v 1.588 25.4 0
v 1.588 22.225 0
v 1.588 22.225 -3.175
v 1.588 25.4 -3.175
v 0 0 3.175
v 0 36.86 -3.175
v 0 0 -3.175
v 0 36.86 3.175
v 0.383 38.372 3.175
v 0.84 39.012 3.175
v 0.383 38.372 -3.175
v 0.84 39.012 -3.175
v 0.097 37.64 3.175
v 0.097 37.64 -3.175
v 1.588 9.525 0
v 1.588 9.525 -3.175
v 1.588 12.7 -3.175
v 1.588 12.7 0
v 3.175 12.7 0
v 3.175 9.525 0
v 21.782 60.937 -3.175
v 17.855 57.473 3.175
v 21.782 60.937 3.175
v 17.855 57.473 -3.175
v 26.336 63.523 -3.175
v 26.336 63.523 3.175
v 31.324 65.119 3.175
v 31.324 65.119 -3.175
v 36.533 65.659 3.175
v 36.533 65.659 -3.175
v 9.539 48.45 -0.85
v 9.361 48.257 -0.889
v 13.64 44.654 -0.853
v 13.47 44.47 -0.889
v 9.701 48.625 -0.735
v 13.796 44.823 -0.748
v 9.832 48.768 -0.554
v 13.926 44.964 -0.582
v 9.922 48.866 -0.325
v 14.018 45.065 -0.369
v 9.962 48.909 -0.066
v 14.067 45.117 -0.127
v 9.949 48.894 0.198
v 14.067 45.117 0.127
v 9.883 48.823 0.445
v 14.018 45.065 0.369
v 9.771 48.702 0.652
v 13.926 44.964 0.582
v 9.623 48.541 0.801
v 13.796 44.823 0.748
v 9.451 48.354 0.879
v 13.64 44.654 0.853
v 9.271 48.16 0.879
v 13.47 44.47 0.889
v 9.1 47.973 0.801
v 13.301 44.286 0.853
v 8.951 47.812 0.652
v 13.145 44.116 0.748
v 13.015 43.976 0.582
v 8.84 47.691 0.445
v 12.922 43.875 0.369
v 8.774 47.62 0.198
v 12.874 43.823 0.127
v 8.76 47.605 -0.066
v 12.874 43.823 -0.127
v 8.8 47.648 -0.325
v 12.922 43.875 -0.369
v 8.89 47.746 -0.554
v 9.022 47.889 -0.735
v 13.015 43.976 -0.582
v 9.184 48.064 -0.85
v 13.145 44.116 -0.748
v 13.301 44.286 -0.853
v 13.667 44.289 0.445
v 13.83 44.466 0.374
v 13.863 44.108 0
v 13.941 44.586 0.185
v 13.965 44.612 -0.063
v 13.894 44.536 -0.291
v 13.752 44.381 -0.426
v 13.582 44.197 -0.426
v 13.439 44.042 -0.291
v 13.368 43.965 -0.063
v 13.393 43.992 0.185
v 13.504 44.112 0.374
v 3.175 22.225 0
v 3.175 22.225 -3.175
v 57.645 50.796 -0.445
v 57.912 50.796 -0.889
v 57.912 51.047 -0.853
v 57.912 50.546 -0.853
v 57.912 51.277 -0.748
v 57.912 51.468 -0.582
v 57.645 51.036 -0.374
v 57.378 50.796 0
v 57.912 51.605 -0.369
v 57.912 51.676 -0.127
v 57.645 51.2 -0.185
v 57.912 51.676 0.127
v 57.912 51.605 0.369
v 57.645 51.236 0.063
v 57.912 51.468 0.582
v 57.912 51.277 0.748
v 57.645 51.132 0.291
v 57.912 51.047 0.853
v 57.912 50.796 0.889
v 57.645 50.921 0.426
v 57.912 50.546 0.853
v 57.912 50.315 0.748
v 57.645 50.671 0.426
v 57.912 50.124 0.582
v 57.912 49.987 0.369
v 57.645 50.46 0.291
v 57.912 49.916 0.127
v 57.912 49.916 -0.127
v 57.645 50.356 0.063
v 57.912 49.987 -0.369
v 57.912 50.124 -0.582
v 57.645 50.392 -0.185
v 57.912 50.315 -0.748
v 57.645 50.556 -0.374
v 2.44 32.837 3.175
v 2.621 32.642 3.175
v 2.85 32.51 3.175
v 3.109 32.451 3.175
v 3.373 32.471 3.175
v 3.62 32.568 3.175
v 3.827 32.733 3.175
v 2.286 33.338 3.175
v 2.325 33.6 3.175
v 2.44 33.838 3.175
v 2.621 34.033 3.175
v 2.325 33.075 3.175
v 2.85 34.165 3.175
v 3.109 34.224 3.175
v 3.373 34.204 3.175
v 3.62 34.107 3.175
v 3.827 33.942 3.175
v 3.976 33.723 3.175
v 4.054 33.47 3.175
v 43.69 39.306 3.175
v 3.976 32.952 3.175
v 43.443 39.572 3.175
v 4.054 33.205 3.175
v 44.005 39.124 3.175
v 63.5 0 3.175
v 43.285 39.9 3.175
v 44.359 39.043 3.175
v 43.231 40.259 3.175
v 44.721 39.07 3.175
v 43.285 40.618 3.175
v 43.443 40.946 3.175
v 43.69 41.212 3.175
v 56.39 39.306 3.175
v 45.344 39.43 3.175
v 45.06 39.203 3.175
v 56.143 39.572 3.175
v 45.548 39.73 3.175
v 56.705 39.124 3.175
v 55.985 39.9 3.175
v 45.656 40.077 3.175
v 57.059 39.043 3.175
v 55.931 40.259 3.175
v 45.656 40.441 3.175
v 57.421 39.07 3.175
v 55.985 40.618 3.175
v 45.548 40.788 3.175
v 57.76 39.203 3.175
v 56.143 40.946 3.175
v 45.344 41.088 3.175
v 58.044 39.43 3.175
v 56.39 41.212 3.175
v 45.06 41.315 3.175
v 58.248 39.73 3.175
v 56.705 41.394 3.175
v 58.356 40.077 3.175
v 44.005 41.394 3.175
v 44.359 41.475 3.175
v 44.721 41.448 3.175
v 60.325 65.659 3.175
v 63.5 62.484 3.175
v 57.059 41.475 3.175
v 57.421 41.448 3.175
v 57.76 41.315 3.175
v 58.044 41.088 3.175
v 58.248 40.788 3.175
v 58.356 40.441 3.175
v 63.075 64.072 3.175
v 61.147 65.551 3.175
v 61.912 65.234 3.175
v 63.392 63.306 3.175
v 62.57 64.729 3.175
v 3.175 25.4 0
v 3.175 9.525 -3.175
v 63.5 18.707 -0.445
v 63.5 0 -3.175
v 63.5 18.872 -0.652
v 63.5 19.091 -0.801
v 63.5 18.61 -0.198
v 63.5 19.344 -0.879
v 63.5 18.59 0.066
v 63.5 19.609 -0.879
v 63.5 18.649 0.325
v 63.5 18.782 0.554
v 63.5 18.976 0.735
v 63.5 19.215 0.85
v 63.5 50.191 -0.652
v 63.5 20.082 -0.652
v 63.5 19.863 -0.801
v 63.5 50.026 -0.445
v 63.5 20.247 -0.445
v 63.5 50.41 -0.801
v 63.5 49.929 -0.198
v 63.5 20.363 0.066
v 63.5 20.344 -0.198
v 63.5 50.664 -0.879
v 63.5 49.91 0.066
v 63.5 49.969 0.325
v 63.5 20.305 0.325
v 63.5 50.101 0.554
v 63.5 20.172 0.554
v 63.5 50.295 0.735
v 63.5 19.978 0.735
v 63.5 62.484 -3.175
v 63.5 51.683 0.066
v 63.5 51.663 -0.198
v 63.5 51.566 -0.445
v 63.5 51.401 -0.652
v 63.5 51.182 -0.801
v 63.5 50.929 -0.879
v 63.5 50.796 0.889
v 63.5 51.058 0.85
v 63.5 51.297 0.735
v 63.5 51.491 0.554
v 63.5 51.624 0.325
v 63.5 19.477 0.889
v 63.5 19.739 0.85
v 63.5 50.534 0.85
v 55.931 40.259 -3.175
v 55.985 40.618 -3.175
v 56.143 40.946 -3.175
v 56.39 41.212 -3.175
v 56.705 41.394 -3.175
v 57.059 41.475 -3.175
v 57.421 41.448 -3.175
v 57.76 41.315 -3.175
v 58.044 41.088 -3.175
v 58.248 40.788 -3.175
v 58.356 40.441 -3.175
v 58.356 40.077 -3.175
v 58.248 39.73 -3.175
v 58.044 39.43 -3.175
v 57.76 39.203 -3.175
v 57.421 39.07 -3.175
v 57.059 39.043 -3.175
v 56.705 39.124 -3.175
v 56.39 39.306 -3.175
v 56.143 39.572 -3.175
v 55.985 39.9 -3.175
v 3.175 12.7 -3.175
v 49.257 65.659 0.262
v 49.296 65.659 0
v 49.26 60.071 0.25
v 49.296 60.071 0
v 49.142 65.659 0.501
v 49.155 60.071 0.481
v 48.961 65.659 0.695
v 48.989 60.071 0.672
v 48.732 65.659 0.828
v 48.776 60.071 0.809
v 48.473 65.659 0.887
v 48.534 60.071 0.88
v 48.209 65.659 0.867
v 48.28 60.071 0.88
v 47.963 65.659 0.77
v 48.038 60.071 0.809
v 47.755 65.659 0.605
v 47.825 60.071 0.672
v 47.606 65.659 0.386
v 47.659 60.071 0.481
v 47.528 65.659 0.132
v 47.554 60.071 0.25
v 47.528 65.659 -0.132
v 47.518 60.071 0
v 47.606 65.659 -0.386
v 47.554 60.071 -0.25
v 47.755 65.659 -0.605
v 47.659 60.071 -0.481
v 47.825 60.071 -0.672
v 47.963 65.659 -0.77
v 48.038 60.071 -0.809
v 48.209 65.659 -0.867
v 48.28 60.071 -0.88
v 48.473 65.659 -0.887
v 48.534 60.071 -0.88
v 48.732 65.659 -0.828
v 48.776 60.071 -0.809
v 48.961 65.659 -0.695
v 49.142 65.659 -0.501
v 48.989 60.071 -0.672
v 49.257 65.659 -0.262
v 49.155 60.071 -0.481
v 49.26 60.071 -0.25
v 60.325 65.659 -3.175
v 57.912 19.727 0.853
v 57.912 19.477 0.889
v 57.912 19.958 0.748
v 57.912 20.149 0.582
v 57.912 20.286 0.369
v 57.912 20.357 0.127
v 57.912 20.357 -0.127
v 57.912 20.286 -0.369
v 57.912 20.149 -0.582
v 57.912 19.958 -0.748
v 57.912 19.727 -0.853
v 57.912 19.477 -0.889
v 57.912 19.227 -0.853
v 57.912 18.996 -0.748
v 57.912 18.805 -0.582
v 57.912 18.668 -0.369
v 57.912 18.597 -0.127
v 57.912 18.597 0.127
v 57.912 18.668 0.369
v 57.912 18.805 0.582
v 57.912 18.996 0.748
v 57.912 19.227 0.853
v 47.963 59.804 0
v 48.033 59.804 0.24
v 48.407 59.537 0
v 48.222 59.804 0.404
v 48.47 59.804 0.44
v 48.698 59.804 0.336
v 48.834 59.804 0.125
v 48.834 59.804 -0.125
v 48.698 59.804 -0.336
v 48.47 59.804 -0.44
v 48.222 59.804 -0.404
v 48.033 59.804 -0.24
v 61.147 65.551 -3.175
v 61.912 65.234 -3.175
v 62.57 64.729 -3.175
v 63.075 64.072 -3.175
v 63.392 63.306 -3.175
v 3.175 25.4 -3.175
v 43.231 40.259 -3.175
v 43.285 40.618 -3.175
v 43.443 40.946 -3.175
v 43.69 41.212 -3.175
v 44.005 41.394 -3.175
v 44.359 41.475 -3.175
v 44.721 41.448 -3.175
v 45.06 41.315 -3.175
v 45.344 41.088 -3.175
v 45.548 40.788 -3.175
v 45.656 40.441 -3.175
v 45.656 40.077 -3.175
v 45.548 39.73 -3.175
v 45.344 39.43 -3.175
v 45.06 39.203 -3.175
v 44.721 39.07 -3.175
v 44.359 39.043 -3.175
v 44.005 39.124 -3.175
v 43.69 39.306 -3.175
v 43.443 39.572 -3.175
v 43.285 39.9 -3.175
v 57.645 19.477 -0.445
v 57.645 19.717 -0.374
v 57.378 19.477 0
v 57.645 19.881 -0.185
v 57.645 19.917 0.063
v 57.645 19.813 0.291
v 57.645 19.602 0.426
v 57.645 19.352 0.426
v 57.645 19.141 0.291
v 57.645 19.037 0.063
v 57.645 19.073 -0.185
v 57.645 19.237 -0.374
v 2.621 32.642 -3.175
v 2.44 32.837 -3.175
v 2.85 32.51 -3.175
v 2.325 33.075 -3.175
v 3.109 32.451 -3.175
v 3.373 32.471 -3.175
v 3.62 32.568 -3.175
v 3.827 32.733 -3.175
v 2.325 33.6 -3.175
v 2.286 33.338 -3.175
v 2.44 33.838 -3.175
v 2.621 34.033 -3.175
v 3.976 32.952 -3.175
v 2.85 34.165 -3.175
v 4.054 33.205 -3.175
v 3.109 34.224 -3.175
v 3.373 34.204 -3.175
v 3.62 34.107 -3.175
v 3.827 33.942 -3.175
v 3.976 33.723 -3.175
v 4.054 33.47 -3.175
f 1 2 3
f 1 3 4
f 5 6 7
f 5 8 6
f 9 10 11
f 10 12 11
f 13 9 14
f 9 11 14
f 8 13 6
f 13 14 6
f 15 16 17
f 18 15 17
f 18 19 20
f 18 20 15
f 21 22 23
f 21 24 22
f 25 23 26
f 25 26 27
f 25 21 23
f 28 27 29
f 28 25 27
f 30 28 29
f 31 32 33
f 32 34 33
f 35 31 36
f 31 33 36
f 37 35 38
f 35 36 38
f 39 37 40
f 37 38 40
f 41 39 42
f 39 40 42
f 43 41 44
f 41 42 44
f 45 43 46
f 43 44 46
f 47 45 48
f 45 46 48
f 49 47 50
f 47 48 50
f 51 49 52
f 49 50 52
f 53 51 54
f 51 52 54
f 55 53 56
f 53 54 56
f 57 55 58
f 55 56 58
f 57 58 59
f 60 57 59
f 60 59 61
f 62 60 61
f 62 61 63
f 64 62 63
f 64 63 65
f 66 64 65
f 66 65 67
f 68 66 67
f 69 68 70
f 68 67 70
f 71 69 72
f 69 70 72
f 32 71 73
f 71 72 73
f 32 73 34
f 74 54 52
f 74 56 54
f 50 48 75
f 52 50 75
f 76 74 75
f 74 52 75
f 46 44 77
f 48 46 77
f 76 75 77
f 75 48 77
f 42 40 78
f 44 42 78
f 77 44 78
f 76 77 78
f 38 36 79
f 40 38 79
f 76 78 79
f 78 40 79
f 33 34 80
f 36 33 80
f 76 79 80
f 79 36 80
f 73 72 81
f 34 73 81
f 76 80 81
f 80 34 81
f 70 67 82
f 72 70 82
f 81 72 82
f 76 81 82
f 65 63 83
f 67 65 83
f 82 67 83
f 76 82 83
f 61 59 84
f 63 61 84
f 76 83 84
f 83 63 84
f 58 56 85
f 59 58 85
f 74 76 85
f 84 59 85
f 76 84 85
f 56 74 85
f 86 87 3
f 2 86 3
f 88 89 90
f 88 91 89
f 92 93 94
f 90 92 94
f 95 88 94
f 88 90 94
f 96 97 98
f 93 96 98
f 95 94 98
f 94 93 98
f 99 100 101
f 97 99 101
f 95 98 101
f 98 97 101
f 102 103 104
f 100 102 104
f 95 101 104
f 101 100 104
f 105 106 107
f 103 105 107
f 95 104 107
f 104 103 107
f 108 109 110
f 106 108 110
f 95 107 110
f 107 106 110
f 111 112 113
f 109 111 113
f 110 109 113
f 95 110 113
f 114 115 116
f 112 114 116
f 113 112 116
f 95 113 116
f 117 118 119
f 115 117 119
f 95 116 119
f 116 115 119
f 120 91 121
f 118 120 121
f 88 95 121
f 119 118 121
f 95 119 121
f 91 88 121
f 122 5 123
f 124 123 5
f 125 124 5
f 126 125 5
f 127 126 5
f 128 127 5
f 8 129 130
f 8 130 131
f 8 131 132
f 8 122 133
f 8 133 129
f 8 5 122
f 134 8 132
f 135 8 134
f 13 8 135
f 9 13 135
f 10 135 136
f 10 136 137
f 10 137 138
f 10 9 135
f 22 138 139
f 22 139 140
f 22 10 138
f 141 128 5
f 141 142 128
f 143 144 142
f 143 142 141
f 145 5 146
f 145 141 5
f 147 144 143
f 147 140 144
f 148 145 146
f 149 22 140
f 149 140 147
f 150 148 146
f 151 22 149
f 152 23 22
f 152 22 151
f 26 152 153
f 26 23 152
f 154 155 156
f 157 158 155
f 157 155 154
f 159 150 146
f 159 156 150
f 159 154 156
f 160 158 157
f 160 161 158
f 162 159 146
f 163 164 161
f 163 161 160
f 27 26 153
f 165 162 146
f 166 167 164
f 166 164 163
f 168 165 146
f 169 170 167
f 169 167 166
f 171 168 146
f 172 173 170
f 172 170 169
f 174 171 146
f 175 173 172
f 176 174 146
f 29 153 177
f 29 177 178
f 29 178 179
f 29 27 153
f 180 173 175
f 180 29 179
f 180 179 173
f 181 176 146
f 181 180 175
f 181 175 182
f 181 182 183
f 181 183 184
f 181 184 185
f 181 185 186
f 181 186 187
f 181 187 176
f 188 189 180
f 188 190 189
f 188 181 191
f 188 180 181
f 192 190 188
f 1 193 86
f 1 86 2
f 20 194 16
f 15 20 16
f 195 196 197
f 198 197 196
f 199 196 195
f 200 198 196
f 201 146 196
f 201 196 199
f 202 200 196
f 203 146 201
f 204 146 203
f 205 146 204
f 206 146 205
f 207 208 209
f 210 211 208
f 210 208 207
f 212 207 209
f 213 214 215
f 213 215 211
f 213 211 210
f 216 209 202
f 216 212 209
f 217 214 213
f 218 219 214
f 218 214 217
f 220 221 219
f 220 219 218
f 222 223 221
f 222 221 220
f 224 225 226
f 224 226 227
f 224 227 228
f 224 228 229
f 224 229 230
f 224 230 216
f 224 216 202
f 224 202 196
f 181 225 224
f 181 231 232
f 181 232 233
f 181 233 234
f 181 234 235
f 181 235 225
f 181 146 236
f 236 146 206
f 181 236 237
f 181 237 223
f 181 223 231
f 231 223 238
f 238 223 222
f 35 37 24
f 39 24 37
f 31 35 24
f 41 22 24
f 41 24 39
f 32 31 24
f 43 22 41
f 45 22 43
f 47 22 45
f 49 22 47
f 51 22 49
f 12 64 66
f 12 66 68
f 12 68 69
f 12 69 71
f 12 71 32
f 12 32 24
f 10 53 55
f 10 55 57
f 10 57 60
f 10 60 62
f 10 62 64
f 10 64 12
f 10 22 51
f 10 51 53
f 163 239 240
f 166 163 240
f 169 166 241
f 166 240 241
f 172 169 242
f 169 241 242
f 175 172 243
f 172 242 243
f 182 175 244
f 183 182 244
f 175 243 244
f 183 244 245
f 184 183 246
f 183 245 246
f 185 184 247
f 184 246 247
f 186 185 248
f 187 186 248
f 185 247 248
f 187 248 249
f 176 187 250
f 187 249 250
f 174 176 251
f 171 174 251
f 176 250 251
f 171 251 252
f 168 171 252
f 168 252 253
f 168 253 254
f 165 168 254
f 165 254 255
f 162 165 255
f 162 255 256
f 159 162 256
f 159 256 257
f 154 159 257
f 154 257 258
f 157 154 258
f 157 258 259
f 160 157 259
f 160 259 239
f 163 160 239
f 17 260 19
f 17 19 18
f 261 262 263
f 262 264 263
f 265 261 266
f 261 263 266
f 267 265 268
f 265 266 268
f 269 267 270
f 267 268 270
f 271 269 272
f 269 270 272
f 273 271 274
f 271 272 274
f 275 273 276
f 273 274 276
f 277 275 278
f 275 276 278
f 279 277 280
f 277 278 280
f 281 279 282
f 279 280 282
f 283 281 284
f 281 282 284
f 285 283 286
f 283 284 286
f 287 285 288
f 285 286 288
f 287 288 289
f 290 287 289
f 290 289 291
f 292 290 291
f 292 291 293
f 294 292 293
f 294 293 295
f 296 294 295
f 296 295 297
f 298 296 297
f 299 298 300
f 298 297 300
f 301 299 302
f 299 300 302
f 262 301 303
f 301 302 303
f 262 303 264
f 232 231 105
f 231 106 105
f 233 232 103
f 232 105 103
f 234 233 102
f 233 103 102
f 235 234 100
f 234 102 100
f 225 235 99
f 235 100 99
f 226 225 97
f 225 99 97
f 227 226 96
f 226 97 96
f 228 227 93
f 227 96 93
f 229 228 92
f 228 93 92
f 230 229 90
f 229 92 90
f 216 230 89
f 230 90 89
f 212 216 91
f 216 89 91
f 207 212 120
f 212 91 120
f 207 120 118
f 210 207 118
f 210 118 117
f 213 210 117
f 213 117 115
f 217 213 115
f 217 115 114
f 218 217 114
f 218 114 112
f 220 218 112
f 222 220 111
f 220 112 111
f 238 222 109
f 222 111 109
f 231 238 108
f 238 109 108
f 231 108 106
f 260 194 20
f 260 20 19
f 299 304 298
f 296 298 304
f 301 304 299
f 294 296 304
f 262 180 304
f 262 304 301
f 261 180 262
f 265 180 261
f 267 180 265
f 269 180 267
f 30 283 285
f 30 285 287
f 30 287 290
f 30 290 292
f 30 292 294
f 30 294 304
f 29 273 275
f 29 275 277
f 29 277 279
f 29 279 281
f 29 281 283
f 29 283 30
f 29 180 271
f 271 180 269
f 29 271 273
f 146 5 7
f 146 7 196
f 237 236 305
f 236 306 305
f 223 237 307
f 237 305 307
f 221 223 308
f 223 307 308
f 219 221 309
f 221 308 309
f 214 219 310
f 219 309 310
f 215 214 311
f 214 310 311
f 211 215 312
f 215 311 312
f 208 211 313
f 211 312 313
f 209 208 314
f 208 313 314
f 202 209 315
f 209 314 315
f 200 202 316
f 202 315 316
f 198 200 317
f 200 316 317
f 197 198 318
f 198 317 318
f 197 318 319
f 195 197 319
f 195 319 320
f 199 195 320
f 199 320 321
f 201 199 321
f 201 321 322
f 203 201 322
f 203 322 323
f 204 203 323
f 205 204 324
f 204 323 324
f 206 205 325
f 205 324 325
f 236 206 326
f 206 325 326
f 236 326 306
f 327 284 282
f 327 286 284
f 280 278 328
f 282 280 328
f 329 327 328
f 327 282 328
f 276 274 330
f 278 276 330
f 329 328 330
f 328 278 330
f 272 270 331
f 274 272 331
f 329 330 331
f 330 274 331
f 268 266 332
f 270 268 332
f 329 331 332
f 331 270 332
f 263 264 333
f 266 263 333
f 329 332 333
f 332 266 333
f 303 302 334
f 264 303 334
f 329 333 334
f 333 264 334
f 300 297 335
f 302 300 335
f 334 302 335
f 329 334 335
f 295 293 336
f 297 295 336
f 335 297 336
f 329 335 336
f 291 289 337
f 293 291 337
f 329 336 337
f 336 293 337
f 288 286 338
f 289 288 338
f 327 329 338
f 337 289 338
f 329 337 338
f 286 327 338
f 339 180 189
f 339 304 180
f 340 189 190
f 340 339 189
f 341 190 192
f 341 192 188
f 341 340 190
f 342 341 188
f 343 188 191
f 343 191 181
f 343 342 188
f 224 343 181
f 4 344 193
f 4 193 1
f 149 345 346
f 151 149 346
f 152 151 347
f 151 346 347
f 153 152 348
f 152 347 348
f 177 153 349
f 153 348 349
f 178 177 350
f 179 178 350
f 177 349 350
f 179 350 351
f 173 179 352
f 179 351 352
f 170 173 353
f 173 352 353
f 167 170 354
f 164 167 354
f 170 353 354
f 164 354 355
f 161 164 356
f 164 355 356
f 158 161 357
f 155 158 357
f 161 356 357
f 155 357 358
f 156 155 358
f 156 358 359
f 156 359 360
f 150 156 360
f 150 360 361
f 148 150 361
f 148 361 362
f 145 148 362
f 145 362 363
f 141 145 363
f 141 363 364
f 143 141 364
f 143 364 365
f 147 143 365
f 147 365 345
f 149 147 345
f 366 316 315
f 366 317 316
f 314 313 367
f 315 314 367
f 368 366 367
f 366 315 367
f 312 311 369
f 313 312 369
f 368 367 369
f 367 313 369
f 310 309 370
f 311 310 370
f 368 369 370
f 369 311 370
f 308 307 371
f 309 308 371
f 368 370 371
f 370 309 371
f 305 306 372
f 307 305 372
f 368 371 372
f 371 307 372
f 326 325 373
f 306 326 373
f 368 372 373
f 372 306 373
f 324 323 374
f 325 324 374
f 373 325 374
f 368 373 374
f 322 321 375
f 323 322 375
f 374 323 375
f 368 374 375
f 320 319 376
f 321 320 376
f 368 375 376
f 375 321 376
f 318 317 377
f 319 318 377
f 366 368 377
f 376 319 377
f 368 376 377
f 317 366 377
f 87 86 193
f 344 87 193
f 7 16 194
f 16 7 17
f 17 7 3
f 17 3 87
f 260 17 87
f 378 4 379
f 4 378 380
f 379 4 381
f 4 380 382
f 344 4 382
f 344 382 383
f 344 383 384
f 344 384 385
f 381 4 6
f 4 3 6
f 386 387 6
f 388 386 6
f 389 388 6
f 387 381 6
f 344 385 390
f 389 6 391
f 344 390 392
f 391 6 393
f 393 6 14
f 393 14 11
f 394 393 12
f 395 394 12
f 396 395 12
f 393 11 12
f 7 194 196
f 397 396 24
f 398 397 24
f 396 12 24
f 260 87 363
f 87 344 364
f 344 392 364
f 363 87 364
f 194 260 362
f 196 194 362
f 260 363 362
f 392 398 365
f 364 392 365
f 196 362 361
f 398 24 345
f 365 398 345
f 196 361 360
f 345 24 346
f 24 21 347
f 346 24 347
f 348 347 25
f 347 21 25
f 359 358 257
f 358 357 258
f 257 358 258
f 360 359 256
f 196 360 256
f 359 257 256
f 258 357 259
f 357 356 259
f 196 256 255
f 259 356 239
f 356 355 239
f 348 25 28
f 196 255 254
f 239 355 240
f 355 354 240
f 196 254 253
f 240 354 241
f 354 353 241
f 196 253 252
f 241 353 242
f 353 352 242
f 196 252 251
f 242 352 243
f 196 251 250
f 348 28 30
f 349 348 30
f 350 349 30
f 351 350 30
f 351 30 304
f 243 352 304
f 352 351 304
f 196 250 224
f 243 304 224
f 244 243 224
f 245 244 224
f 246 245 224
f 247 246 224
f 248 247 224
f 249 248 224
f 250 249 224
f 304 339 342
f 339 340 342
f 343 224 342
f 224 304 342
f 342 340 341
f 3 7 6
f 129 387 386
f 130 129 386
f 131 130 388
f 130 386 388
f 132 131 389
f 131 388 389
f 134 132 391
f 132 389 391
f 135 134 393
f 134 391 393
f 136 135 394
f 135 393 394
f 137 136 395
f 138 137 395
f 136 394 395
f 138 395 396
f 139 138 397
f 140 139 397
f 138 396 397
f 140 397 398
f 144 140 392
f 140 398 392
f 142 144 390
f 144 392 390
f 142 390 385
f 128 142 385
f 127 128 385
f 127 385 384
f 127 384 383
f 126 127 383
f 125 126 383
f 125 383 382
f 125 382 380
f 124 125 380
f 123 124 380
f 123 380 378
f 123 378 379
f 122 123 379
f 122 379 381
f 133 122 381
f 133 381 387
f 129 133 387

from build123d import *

# Parameters (mm, degrees)
BOSS_EXTRUDE1_DEPTH       = 3.175
FILLET1_R                 = 25.4
FILLET2_R                 = 3.175
FILLET3_R                 = 3.175
F_2_56_TAPPED_HOLE1_D     = 1.778
F_2_56_TAPPED_HOLE1_DEPTH = 5.588
F_2_56_TAPPED_HOLE1_TIP   = 0.53416509
F_2_CLEARANCE_HOLE1_D     = 2.4384
F_2_CLEARANCE_HOLE1_DEPTH = 25.4
F_2_CLEARANCE_HOLE1_TIP   = 0.732569267
SKETCH12_W                = 1.5875
SKETCH12_H                = 3.175
CUT_EXTRUDE1_DEPTH        = 3.175
F_2_56_TAPPED_HOLE2_D     = 1.778
F_2_56_TAPPED_HOLE2_DEPTH = 5.588
F_2_56_TAPPED_HOLE2_TIP   = 0.53416509
F_2_56_TAPPED_HOLE3_D     = 1.778
F_2_56_TAPPED_HOLE3_DEPTH = 5.588
F_2_56_TAPPED_HOLE3_TIP   = 0.53416509
F_2_56_TAPPED_HOLE4_D     = 1.778
F_2_56_TAPPED_HOLE4_DEPTH = 10.668
F_2_56_TAPPED_HOLE4_TIP   = 0.53416509


with BuildPart() as part:
    # Sketch1 → Boss-Extrude1 (new body, symmetric)
    with BuildSketch(Plane.XY):
        Polygon((0, 38.1), (0, 0), (63.5, 0), (63.5, 65.659), (25.4, 65.659), align=None)
    extrude(amount=BOSS_EXTRUDE1_DEPTH, both=True)

    # Fillet1
    fillet1_edges = [part.edges().sort_by_distance(p)[0] for p in [
        (25.4, 65.659, 0),
    ]]
    fillet(fillet1_edges, radius=FILLET1_R)

    # Fillet2
    fillet2_edges = [part.edges().sort_by_distance(p)[0] for p in [
        (0, 38.1, 0),
    ]]
    fillet(fillet2_edges, radius=FILLET2_R)

    # Fillet3
    fillet3_edges = [part.edges().sort_by_distance(p)[0] for p in [
        (63.5, 65.659, 0),
    ]]
    fillet(fillet3_edges, radius=FILLET3_R)

    # #2-56 Tapped Hole1
    with Locations(Plane(origin=(63.5, 0, 0), x_dir=(0, 0, -1), z_dir=(1, 0, 0))):
        with Locations((0, 50.796059009), (0, 19.476973799)):
            Hole(F_2_56_TAPPED_HOLE1_D / 2, depth=F_2_56_TAPPED_HOLE1_DEPTH)
            with Locations((0, 0, -(F_2_56_TAPPED_HOLE1_DEPTH + F_2_56_TAPPED_HOLE1_TIP / 2))):  # 118° drill point
                Cone(0, F_2_56_TAPPED_HOLE1_D / 2, F_2_56_TAPPED_HOLE1_TIP, mode=Mode.SUBTRACT)

    # #2 Clearance Hole1
    with Locations(Plane.XY.offset(3.175)):
        with Locations((57.15, 40.259), (44.45, 40.259)):
            Hole(F_2_CLEARANCE_HOLE1_D / 2, depth=F_2_CLEARANCE_HOLE1_DEPTH)
            with Locations((0, 0, -(F_2_CLEARANCE_HOLE1_DEPTH + F_2_CLEARANCE_HOLE1_TIP / 2))):  # 118° drill point
                Cone(0, F_2_CLEARANCE_HOLE1_D / 2, F_2_CLEARANCE_HOLE1_TIP, mode=Mode.SUBTRACT)

    # Sketch12 → Cut-Extrude1 (cut)
    with BuildSketch(Plane(origin=(0, 0, -3.175), x_dir=(-1, 0, 0), z_dir=(0, 0, -1))):
        with Locations((-2.38125, 23.8125)):
            Rectangle(SKETCH12_W, SKETCH12_H)
        with Locations((-2.38125, 11.1125)):
            Rectangle(SKETCH12_W, SKETCH12_H)
    extrude(amount=-CUT_EXTRUDE1_DEPTH, mode=Mode.SUBTRACT)

    # #2-56 Tapped Hole2
    with Locations(Plane(origin=(-18.986783635, 17.499339756, 0), x_dir=(0, 0, 1), z_dir=(-0.735322884, 0.677716944, 0))):
        with Locations((0, 41.828773603)):
            Hole(F_2_56_TAPPED_HOLE2_D / 2, depth=F_2_56_TAPPED_HOLE2_DEPTH)
            with Locations((0, 0, -(F_2_56_TAPPED_HOLE2_DEPTH + F_2_56_TAPPED_HOLE2_TIP / 2))):  # 118° drill point
                Cone(0, F_2_56_TAPPED_HOLE2_D / 2, F_2_56_TAPPED_HOLE2_TIP, mode=Mode.SUBTRACT)

    # #2-56 Tapped Hole3
    with Locations(Plane(origin=(0, 65.659, 0), x_dir=(-1, 0, 0), z_dir=(0, 1, 0))):
        with Locations((-48.407010359, 0)):
            Hole(F_2_56_TAPPED_HOLE3_D / 2, depth=F_2_56_TAPPED_HOLE3_DEPTH)
            with Locations((0, 0, -(F_2_56_TAPPED_HOLE3_DEPTH + F_2_56_TAPPED_HOLE3_TIP / 2))):  # 118° drill point
                Cone(0, F_2_56_TAPPED_HOLE3_D / 2, F_2_56_TAPPED_HOLE3_TIP, mode=Mode.SUBTRACT)

    # #2-56 Tapped Hole4
    with Locations(Plane.XY.offset(3.175)):
        with Locations((3.175, 33.3375)):
            Hole(F_2_56_TAPPED_HOLE4_D / 2, depth=F_2_56_TAPPED_HOLE4_DEPTH)
            with Locations((0, 0, -(F_2_56_TAPPED_HOLE4_DEPTH + F_2_56_TAPPED_HOLE4_TIP / 2))):  # 118° drill point
                Cone(0, F_2_56_TAPPED_HOLE4_D / 2, F_2_56_TAPPED_HOLE4_TIP, mode=Mode.SUBTRACT)


solid = part.part
